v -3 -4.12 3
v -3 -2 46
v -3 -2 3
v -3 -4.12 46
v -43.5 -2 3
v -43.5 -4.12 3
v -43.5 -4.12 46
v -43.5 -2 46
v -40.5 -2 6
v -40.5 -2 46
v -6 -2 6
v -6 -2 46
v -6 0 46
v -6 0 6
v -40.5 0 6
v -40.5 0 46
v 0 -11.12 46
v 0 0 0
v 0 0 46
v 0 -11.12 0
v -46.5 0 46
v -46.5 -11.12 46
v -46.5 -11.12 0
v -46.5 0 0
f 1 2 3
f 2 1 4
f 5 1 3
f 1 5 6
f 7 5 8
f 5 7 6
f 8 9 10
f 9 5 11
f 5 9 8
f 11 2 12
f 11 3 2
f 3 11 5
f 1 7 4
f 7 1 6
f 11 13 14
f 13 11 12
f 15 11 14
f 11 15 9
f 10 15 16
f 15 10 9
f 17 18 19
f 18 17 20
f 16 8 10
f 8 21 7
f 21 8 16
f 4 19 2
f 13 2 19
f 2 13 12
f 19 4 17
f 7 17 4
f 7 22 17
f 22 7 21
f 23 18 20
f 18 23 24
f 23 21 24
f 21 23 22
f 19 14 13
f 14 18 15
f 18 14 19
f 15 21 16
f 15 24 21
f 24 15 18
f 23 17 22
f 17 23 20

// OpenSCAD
$fn = 60;

depth = 47.5;
corner = 8.5;
hole = 4;
holes = [
    [9.46, 0],
    [36.58, -2]
];
glass_clearance = 2;
front_clearance = 4;
wall_width = 3;
support_height = 43;
support_clearance = 1;

rfid_width = 39.5;
rfid_length = 60;
rfid_depth = 1.12;
rfid_hole = 3;
rfid_holes = [
    [rfid_width/2 + 25.5/2, 6.7],
    [rfid_width/2 - 25.5/2, 6.7],
    [rfid_width/2 + 34/2, 44.4],
    [rfid_width/2 - 34/2, 44.4]
];
rfid_pin_hole = 0.9;
rfid_pin_count = 7;
rfid_pin_xy = [10,0.7];
rfid_pin_pitch = 2.54;

module wall () {
    height = 400;
    thick = depth/2;
    length = 400;
    wthick = 5;
    difference() {
        union() {
            translate([0,-depth,-height/2]) cube([thick, depth, height]);
            translate([-length/2,0,-height/2]) cube([length,wthick,height]);
            translate([0,0,-height/2]) cylinder(r = corner, h = height);
        }
        translate([0,-holes[0][0],holes[0][1]]) rotate([0, 90, 0]) cylinder(d = hole, h = 5, center = true);
        translate([0,-holes[1][0],holes[1][1]]) rotate([0, 90, 0]) cylinder(d = hole, h = 5, center = true);
    }
}

module rfid () {
    difference() {
        union() {
            translate ([0,-rfid_depth,0]) cube([rfid_width,rfid_depth,rfid_length]);
            translate([rfid_width-3.5,-3.5-rfid_depth,rfid_length-9.9-2.7]) cube([3.5,3.5,9.9]);
        }
        for (h = rfid_holes) {
            translate([h[0],0.01,h[1]]) rotate([90,0,0]) cylinder(d = rfid_hole, h=rfid_depth + 0.02);
        }

        translate([rfid_pin_xy[0]+rfid_pin_pitch/2,0,rfid_length-rfid_pin_xy[1]-rfid_pin_pitch/2]) {
            for (p = [0 : 1 : rfid_pin_count]) {
                translate([p * rfid_pin_pitch,0.01,0]) rotate([90,0,0]) cylinder(d = rfid_pin_hole, h=rfid_depth + 0.02);
            }
        }
    }
}

module card_support() {
    s_width = rfid_width + wall_width*2 + support_clearance;
    s_height = support_height + wall_width;
    s_thick = glass_clearance + rfid_depth + support_clearance + front_clearance + wall_width;
    translate([-s_width,-s_thick,0]) {
        difference() {
            cube([s_width,s_thick,s_height]);
            translate([
                wall_width,
                s_thick-rfid_depth-support_clearance-glass_clearance,
                wall_width
            ]) {
                cube([rfid_width+support_clearance,rfid_depth + support_clearance,s_height]);
                translate([wall_width,0.01,wall_width]) cube([rfid_width+support_clearance-wall_width*2,rfid_depth + support_clearance+glass_clearance,s_height]);
            }
        }
    }
}

module part() {

    // build some rails so the part will slide in
    card_support();

    %translate([-rfid_width-wall_width-support_clearance/2,-glass_clearance,wall_width]) rfid();
}


%wall();
part();
